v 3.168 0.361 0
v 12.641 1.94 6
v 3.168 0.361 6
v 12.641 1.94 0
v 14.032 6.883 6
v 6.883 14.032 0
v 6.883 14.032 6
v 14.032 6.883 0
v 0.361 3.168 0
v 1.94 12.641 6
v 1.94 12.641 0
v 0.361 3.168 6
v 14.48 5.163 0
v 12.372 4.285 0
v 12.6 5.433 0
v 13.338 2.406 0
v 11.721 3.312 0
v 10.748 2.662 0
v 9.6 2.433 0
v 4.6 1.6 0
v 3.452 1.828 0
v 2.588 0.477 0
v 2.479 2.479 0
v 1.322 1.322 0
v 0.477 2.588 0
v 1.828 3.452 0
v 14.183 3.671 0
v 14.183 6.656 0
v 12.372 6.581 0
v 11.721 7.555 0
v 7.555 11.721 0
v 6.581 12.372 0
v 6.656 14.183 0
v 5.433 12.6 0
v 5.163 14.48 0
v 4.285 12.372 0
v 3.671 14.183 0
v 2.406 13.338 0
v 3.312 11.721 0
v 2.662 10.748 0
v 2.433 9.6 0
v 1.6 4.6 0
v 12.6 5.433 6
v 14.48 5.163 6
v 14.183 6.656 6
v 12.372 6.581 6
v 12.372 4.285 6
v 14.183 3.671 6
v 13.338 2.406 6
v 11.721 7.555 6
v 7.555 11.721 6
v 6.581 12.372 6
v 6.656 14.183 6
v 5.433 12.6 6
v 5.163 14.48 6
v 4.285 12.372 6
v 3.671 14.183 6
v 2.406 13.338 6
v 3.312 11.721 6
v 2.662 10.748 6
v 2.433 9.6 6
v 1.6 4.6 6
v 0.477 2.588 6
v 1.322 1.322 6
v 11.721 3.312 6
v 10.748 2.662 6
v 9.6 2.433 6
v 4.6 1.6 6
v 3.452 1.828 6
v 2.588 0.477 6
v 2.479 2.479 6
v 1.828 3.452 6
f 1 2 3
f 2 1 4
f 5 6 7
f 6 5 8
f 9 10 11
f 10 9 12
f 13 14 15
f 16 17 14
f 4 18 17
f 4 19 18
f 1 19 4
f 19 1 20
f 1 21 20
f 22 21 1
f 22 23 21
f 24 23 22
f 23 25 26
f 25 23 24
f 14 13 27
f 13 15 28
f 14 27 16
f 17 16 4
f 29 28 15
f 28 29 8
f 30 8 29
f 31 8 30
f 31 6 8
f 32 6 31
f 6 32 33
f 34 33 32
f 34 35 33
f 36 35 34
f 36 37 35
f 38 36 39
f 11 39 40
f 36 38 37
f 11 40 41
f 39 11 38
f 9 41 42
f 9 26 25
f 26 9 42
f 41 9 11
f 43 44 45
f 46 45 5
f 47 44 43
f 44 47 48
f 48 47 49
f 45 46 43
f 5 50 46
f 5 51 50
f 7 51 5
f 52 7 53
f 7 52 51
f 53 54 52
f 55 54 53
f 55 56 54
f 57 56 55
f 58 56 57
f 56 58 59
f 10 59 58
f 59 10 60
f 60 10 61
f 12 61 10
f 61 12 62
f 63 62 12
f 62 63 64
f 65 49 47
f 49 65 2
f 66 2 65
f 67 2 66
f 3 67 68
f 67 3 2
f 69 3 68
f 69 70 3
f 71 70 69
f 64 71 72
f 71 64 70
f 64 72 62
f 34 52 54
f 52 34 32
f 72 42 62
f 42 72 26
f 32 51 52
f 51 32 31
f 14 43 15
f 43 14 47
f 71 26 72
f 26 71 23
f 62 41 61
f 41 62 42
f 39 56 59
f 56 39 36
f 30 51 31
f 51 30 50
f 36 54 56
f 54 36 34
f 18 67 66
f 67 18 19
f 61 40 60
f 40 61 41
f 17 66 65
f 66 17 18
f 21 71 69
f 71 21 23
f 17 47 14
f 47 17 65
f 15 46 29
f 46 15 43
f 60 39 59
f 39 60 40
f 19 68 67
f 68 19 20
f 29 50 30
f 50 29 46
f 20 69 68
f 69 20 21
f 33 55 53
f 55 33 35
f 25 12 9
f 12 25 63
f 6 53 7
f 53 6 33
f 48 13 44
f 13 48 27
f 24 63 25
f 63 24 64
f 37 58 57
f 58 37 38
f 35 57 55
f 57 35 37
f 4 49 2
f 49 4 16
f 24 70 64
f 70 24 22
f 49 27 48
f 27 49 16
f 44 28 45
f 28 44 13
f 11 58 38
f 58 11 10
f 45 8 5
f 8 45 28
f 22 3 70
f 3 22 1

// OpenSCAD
$height=6;
$rad=1;
$dist=15;
$inrad=3;
$indist = 5;
$frac = 0.2;

$fn=16;
module shell (h, r, d) {
	hull() {
	    translate([0,0,0]) {
	       cylinder(r=r, h=h);
	    }
	    translate([d,d/6,0]) {
	       cylinder(r=r, h=h);
	    }
	    translate([d/6,d,0]) {
	       cylinder(r=r, h=h);
	    }
	}
}

module pool_rack() {
	translate([1,1,0]) {
	    difference() {
	        shell($height, $rad, $dist);
	        translate([$inrad+($frac*$inrad), $inrad+($frac*$inrad), -1]) {
	           shell($height+2, $inrad, $indist);
	        }
	   }
	}
}

difference() {
    pool_rack();
	translate([-1.9,-1.9,0]) {
		scale(1.3) {
		   pool_rack();
		}
	}
}
